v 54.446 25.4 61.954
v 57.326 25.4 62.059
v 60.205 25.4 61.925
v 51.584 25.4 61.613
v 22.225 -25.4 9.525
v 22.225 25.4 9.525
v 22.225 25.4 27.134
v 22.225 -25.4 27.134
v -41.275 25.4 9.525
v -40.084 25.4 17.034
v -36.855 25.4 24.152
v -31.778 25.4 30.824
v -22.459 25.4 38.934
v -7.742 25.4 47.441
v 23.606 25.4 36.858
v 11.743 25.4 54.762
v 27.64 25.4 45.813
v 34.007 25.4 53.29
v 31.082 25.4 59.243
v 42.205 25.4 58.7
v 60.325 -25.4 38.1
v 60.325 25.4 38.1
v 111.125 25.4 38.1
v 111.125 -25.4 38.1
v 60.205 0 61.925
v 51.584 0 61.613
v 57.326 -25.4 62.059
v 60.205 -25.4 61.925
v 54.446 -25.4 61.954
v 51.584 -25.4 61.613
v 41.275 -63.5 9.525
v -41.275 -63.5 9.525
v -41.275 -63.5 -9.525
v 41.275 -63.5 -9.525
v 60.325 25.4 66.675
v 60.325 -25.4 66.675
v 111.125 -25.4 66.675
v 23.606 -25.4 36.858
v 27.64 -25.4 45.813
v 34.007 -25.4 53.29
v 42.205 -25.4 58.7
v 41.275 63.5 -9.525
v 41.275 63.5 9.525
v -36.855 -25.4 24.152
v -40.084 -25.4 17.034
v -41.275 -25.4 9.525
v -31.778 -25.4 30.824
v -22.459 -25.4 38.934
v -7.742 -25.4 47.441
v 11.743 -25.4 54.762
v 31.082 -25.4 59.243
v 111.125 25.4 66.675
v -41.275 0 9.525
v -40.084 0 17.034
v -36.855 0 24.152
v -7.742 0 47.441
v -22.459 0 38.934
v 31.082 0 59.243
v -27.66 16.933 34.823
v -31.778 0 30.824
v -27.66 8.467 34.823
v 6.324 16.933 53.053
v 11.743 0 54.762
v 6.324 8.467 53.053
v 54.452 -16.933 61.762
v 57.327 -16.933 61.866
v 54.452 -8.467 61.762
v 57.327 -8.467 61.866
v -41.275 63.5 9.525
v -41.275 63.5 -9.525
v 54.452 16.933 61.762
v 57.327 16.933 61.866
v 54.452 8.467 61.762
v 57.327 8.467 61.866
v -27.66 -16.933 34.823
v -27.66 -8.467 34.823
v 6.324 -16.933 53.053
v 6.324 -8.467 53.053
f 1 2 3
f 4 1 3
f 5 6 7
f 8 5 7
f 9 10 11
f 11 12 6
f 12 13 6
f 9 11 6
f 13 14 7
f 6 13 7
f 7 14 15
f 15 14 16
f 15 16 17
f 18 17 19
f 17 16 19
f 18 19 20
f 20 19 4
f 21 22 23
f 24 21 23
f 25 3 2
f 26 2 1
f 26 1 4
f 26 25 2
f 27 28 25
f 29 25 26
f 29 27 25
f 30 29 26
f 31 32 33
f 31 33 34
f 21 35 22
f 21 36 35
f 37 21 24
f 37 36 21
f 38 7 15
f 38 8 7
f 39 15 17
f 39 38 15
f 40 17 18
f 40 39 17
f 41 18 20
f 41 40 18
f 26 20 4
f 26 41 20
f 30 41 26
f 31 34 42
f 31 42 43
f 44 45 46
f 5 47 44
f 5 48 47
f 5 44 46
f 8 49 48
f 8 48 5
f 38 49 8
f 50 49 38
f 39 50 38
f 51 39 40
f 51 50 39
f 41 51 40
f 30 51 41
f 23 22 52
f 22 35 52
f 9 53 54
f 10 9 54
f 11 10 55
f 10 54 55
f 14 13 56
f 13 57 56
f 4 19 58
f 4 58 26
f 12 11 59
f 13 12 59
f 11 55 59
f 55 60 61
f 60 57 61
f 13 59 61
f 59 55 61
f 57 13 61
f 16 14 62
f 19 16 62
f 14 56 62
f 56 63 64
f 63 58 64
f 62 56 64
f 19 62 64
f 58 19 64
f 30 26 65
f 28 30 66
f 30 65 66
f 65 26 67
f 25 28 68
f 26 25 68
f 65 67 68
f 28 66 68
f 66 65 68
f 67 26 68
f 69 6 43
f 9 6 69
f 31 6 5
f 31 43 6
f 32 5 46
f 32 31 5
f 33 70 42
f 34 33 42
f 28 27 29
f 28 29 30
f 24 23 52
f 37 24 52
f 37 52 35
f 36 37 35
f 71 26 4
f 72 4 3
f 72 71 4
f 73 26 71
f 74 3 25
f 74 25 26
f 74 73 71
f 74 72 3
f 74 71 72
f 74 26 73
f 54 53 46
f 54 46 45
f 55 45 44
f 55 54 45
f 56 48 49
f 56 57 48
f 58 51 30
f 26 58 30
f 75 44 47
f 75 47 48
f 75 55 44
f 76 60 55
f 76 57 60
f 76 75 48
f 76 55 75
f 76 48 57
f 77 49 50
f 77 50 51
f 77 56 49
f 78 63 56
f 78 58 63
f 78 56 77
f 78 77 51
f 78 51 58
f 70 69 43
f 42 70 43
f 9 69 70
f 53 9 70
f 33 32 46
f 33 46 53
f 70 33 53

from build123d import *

# Parameters (mm, degrees)
F1_DEPTH = 63.5
F2_DEPTH = 25.4
F0_W     = 25.4
F0_H     = 4.7752
F0_H_2   = 4.7498
F0_H_3   = 19.05


with BuildPart() as f1:
    # F0 (on Front) → F1 (new body, symmetric)
    with BuildSketch(Plane.XZ):
        Polygon((-41.275, 9.525), (-41.275, -9.525), (41.275, -9.525), (41.275, 9.525), (22.225, 9.525), align=None)
    extrude(amount=F1_DEPTH, both=True)



with BuildPart() as f2:
    # F0 (on Front) → F2 (new body, symmetric)
    with BuildSketch(Plane.XZ):
        with BuildLine():
            ThreePointArc((60.2050781489, 61.9252), (55.8848287456, 62.0361555078), (51.5839516114, 61.6126913338))
            add(Edge.make_bspline(
                [(51.5839516114, 61.6126913338), (54.448865566, 61.7836535364), (57.3254993367, 61.8886603407), (60.2050781489, 61.9252)],
                knots=[107.760472716, 107.760472716, 107.760472716, 107.760472716, 114.2102763377, 114.2102763377, 114.2102763377, 114.2102763377], degree=3))
        make_face()
    extrude(amount=F2_DEPTH, both=True)


with BuildPart() as f1_1:
    add(f1.part)

    add(f2.part)  # F2#2 merges F2
    # F0 (on Front) → F2, piece 2 (join, symmetric)
    with BuildSketch(Plane.XZ):
        Polygon((-41.275, 9.525), (-41.275, -9.525), (41.275, -9.525), (41.275, 9.525), (22.225, 9.525), align=None)
        with BuildLine():
            add(Edge.make_bspline(
                [(-41.275, 9.525), (-40.8759856478, 37.4890133088), (3.7182334986, 58.7563302966), (51.5839516114, 61.6126913338)],
                knots=[0, 0, 0, 0, 107.760472716, 107.760472716, 107.760472716, 107.760472716], degree=3))
            Line((-41.275, 9.525), (22.225, 9.525))
            Line((22.225, 9.525), (22.225, 27.1340786829))
            ThreePointArc((22.225, 27.1340786829), (30.5591193736, 49.7765320065), (51.5839516114, 61.6126913338))
        make_face()
    extrude(amount=F2_DEPTH, both=True)


with BuildPart() as f2b:
    # F0 (on Front) → F2, piece 3 (new body, symmetric)
    with BuildSketch(Plane.XZ):
        with Locations((73.025, 40.4876)):
            Rectangle(F0_W, F0_H)
        with Locations((73.025, 64.3001)):
            Rectangle(F0_W, F0_H_2)
        Polygon((85.725, 66.675), (85.725, 61.9252), (85.725, 42.8752), (85.725, 38.1), (111.125, 38.1), (111.125, 66.675), align=None)
        with Locations((73.025, 52.4002)):
            Rectangle(F0_W, F0_H_3)
    extrude(amount=F2_DEPTH, both=True)


solid = Compound([f1_1.part, f2b.part])
